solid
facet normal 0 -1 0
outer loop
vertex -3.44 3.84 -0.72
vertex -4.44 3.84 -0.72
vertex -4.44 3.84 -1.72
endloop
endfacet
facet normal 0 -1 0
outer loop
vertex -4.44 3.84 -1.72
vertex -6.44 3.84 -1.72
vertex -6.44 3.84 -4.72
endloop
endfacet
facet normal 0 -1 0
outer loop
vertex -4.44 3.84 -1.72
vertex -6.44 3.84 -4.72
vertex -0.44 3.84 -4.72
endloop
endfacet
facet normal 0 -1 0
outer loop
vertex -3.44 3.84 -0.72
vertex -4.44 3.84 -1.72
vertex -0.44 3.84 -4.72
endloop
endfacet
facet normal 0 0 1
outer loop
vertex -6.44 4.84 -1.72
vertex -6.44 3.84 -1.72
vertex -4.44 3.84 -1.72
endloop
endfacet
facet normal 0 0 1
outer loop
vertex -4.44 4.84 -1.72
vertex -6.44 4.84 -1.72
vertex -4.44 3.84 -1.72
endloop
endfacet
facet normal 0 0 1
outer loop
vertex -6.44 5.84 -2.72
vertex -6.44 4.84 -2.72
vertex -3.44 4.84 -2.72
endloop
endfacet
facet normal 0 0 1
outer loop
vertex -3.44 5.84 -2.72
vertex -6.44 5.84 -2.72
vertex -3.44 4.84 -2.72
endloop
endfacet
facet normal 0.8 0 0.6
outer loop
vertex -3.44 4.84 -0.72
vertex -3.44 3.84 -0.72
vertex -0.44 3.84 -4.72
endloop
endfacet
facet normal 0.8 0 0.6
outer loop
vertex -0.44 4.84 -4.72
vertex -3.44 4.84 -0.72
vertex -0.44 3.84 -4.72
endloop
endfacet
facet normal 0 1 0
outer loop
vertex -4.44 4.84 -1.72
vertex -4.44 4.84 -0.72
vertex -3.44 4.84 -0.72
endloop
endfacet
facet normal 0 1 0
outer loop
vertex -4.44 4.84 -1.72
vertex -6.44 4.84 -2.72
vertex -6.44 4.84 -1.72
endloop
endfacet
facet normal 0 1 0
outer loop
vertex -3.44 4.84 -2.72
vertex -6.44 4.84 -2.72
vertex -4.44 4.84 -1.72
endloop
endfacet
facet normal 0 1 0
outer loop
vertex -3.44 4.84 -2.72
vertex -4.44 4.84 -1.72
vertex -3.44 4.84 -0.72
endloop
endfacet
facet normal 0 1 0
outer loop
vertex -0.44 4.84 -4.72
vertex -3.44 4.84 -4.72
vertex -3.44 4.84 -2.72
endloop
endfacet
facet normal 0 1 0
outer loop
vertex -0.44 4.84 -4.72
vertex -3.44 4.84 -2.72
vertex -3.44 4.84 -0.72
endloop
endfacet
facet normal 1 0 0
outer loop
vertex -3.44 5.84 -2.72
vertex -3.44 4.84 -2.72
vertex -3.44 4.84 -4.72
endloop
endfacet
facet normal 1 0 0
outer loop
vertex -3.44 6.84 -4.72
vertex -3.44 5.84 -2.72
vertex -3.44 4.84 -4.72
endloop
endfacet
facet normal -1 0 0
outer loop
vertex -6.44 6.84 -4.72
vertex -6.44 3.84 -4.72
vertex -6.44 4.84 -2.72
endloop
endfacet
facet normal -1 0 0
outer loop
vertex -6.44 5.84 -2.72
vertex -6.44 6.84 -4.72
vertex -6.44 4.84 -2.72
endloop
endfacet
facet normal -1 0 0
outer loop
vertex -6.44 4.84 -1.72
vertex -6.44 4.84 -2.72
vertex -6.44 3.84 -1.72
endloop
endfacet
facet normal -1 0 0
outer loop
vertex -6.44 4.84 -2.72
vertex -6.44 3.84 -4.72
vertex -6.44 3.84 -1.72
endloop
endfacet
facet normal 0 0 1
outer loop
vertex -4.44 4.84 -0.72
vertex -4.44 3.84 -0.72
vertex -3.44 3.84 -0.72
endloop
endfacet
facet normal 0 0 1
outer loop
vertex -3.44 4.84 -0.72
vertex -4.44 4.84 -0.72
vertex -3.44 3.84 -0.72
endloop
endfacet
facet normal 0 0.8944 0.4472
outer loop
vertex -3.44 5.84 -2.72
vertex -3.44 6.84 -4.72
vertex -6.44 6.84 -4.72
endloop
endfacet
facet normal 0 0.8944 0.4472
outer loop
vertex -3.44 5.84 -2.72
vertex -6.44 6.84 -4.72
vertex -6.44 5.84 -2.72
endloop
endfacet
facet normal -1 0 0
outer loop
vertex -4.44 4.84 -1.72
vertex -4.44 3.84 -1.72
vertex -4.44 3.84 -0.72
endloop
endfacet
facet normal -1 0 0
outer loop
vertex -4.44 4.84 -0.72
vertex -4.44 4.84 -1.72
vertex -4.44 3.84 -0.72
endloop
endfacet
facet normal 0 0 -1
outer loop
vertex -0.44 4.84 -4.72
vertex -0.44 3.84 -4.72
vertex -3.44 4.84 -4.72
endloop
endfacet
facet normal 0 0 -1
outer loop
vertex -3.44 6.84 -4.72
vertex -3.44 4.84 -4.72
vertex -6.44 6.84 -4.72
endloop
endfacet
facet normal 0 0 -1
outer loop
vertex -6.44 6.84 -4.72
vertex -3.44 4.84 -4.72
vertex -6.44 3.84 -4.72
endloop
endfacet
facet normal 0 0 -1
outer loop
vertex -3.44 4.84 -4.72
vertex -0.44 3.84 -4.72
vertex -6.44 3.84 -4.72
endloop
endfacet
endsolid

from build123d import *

# Parameters (mm, degrees)
EXTRUDE_1_DEPTH     = 5
SKETCH_1_3_W        = 15
SKETCH_1_3_H        = 10
EXTRUDE_2_DEPTH     = 15
CUT_EXTRUDE_1_DEPTH = 15
SCALE_1_SCALE       = 0.2


with BuildPart() as part:
    # 草圖1 → 填料-伸長1 (new body)
    with BuildSketch(Plane(origin=(0, 0, 0), x_dir=(1, 0, 0), z_dir=(0, 1, 0))):
        Polygon((-5, -10), (0, -10), (15, 10), (-15, 10), (-15, -5), (-5, -5), align=None)
    extrude(amount=EXTRUDE_1_DEPTH)

    # 草圖1<3> → 填料-伸長2 (add)
    with BuildSketch(Plane(origin=(0, 0, 0), x_dir=(1, 0, 0), z_dir=(0, 1, 0))):
        with Locations((-7.5, 5)):
            Rectangle(SKETCH_1_3_W, SKETCH_1_3_H)
    extrude(amount=EXTRUDE_2_DEPTH)

    # 草圖2 → 除料-伸長1 (cut)
    with BuildSketch(Plane(origin=(0, 0, 0), x_dir=(0, 0, -1), z_dir=(1, 0, 0))):
        Polygon((10, 15), (0, 10), (0, 15), align=None)
    extrude(amount=-CUT_EXTRUDE_1_DEPTH, mode=Mode.SUBTRACT)


with BuildPart() as part_1:
    # 縮放比例1: scaled about (-4.3, 4.8, -3.4)
    add(part.part.scale(SCALE_1_SCALE).moved(Location((-3.44, 3.84, -2.72))))


solid = part_1.part
